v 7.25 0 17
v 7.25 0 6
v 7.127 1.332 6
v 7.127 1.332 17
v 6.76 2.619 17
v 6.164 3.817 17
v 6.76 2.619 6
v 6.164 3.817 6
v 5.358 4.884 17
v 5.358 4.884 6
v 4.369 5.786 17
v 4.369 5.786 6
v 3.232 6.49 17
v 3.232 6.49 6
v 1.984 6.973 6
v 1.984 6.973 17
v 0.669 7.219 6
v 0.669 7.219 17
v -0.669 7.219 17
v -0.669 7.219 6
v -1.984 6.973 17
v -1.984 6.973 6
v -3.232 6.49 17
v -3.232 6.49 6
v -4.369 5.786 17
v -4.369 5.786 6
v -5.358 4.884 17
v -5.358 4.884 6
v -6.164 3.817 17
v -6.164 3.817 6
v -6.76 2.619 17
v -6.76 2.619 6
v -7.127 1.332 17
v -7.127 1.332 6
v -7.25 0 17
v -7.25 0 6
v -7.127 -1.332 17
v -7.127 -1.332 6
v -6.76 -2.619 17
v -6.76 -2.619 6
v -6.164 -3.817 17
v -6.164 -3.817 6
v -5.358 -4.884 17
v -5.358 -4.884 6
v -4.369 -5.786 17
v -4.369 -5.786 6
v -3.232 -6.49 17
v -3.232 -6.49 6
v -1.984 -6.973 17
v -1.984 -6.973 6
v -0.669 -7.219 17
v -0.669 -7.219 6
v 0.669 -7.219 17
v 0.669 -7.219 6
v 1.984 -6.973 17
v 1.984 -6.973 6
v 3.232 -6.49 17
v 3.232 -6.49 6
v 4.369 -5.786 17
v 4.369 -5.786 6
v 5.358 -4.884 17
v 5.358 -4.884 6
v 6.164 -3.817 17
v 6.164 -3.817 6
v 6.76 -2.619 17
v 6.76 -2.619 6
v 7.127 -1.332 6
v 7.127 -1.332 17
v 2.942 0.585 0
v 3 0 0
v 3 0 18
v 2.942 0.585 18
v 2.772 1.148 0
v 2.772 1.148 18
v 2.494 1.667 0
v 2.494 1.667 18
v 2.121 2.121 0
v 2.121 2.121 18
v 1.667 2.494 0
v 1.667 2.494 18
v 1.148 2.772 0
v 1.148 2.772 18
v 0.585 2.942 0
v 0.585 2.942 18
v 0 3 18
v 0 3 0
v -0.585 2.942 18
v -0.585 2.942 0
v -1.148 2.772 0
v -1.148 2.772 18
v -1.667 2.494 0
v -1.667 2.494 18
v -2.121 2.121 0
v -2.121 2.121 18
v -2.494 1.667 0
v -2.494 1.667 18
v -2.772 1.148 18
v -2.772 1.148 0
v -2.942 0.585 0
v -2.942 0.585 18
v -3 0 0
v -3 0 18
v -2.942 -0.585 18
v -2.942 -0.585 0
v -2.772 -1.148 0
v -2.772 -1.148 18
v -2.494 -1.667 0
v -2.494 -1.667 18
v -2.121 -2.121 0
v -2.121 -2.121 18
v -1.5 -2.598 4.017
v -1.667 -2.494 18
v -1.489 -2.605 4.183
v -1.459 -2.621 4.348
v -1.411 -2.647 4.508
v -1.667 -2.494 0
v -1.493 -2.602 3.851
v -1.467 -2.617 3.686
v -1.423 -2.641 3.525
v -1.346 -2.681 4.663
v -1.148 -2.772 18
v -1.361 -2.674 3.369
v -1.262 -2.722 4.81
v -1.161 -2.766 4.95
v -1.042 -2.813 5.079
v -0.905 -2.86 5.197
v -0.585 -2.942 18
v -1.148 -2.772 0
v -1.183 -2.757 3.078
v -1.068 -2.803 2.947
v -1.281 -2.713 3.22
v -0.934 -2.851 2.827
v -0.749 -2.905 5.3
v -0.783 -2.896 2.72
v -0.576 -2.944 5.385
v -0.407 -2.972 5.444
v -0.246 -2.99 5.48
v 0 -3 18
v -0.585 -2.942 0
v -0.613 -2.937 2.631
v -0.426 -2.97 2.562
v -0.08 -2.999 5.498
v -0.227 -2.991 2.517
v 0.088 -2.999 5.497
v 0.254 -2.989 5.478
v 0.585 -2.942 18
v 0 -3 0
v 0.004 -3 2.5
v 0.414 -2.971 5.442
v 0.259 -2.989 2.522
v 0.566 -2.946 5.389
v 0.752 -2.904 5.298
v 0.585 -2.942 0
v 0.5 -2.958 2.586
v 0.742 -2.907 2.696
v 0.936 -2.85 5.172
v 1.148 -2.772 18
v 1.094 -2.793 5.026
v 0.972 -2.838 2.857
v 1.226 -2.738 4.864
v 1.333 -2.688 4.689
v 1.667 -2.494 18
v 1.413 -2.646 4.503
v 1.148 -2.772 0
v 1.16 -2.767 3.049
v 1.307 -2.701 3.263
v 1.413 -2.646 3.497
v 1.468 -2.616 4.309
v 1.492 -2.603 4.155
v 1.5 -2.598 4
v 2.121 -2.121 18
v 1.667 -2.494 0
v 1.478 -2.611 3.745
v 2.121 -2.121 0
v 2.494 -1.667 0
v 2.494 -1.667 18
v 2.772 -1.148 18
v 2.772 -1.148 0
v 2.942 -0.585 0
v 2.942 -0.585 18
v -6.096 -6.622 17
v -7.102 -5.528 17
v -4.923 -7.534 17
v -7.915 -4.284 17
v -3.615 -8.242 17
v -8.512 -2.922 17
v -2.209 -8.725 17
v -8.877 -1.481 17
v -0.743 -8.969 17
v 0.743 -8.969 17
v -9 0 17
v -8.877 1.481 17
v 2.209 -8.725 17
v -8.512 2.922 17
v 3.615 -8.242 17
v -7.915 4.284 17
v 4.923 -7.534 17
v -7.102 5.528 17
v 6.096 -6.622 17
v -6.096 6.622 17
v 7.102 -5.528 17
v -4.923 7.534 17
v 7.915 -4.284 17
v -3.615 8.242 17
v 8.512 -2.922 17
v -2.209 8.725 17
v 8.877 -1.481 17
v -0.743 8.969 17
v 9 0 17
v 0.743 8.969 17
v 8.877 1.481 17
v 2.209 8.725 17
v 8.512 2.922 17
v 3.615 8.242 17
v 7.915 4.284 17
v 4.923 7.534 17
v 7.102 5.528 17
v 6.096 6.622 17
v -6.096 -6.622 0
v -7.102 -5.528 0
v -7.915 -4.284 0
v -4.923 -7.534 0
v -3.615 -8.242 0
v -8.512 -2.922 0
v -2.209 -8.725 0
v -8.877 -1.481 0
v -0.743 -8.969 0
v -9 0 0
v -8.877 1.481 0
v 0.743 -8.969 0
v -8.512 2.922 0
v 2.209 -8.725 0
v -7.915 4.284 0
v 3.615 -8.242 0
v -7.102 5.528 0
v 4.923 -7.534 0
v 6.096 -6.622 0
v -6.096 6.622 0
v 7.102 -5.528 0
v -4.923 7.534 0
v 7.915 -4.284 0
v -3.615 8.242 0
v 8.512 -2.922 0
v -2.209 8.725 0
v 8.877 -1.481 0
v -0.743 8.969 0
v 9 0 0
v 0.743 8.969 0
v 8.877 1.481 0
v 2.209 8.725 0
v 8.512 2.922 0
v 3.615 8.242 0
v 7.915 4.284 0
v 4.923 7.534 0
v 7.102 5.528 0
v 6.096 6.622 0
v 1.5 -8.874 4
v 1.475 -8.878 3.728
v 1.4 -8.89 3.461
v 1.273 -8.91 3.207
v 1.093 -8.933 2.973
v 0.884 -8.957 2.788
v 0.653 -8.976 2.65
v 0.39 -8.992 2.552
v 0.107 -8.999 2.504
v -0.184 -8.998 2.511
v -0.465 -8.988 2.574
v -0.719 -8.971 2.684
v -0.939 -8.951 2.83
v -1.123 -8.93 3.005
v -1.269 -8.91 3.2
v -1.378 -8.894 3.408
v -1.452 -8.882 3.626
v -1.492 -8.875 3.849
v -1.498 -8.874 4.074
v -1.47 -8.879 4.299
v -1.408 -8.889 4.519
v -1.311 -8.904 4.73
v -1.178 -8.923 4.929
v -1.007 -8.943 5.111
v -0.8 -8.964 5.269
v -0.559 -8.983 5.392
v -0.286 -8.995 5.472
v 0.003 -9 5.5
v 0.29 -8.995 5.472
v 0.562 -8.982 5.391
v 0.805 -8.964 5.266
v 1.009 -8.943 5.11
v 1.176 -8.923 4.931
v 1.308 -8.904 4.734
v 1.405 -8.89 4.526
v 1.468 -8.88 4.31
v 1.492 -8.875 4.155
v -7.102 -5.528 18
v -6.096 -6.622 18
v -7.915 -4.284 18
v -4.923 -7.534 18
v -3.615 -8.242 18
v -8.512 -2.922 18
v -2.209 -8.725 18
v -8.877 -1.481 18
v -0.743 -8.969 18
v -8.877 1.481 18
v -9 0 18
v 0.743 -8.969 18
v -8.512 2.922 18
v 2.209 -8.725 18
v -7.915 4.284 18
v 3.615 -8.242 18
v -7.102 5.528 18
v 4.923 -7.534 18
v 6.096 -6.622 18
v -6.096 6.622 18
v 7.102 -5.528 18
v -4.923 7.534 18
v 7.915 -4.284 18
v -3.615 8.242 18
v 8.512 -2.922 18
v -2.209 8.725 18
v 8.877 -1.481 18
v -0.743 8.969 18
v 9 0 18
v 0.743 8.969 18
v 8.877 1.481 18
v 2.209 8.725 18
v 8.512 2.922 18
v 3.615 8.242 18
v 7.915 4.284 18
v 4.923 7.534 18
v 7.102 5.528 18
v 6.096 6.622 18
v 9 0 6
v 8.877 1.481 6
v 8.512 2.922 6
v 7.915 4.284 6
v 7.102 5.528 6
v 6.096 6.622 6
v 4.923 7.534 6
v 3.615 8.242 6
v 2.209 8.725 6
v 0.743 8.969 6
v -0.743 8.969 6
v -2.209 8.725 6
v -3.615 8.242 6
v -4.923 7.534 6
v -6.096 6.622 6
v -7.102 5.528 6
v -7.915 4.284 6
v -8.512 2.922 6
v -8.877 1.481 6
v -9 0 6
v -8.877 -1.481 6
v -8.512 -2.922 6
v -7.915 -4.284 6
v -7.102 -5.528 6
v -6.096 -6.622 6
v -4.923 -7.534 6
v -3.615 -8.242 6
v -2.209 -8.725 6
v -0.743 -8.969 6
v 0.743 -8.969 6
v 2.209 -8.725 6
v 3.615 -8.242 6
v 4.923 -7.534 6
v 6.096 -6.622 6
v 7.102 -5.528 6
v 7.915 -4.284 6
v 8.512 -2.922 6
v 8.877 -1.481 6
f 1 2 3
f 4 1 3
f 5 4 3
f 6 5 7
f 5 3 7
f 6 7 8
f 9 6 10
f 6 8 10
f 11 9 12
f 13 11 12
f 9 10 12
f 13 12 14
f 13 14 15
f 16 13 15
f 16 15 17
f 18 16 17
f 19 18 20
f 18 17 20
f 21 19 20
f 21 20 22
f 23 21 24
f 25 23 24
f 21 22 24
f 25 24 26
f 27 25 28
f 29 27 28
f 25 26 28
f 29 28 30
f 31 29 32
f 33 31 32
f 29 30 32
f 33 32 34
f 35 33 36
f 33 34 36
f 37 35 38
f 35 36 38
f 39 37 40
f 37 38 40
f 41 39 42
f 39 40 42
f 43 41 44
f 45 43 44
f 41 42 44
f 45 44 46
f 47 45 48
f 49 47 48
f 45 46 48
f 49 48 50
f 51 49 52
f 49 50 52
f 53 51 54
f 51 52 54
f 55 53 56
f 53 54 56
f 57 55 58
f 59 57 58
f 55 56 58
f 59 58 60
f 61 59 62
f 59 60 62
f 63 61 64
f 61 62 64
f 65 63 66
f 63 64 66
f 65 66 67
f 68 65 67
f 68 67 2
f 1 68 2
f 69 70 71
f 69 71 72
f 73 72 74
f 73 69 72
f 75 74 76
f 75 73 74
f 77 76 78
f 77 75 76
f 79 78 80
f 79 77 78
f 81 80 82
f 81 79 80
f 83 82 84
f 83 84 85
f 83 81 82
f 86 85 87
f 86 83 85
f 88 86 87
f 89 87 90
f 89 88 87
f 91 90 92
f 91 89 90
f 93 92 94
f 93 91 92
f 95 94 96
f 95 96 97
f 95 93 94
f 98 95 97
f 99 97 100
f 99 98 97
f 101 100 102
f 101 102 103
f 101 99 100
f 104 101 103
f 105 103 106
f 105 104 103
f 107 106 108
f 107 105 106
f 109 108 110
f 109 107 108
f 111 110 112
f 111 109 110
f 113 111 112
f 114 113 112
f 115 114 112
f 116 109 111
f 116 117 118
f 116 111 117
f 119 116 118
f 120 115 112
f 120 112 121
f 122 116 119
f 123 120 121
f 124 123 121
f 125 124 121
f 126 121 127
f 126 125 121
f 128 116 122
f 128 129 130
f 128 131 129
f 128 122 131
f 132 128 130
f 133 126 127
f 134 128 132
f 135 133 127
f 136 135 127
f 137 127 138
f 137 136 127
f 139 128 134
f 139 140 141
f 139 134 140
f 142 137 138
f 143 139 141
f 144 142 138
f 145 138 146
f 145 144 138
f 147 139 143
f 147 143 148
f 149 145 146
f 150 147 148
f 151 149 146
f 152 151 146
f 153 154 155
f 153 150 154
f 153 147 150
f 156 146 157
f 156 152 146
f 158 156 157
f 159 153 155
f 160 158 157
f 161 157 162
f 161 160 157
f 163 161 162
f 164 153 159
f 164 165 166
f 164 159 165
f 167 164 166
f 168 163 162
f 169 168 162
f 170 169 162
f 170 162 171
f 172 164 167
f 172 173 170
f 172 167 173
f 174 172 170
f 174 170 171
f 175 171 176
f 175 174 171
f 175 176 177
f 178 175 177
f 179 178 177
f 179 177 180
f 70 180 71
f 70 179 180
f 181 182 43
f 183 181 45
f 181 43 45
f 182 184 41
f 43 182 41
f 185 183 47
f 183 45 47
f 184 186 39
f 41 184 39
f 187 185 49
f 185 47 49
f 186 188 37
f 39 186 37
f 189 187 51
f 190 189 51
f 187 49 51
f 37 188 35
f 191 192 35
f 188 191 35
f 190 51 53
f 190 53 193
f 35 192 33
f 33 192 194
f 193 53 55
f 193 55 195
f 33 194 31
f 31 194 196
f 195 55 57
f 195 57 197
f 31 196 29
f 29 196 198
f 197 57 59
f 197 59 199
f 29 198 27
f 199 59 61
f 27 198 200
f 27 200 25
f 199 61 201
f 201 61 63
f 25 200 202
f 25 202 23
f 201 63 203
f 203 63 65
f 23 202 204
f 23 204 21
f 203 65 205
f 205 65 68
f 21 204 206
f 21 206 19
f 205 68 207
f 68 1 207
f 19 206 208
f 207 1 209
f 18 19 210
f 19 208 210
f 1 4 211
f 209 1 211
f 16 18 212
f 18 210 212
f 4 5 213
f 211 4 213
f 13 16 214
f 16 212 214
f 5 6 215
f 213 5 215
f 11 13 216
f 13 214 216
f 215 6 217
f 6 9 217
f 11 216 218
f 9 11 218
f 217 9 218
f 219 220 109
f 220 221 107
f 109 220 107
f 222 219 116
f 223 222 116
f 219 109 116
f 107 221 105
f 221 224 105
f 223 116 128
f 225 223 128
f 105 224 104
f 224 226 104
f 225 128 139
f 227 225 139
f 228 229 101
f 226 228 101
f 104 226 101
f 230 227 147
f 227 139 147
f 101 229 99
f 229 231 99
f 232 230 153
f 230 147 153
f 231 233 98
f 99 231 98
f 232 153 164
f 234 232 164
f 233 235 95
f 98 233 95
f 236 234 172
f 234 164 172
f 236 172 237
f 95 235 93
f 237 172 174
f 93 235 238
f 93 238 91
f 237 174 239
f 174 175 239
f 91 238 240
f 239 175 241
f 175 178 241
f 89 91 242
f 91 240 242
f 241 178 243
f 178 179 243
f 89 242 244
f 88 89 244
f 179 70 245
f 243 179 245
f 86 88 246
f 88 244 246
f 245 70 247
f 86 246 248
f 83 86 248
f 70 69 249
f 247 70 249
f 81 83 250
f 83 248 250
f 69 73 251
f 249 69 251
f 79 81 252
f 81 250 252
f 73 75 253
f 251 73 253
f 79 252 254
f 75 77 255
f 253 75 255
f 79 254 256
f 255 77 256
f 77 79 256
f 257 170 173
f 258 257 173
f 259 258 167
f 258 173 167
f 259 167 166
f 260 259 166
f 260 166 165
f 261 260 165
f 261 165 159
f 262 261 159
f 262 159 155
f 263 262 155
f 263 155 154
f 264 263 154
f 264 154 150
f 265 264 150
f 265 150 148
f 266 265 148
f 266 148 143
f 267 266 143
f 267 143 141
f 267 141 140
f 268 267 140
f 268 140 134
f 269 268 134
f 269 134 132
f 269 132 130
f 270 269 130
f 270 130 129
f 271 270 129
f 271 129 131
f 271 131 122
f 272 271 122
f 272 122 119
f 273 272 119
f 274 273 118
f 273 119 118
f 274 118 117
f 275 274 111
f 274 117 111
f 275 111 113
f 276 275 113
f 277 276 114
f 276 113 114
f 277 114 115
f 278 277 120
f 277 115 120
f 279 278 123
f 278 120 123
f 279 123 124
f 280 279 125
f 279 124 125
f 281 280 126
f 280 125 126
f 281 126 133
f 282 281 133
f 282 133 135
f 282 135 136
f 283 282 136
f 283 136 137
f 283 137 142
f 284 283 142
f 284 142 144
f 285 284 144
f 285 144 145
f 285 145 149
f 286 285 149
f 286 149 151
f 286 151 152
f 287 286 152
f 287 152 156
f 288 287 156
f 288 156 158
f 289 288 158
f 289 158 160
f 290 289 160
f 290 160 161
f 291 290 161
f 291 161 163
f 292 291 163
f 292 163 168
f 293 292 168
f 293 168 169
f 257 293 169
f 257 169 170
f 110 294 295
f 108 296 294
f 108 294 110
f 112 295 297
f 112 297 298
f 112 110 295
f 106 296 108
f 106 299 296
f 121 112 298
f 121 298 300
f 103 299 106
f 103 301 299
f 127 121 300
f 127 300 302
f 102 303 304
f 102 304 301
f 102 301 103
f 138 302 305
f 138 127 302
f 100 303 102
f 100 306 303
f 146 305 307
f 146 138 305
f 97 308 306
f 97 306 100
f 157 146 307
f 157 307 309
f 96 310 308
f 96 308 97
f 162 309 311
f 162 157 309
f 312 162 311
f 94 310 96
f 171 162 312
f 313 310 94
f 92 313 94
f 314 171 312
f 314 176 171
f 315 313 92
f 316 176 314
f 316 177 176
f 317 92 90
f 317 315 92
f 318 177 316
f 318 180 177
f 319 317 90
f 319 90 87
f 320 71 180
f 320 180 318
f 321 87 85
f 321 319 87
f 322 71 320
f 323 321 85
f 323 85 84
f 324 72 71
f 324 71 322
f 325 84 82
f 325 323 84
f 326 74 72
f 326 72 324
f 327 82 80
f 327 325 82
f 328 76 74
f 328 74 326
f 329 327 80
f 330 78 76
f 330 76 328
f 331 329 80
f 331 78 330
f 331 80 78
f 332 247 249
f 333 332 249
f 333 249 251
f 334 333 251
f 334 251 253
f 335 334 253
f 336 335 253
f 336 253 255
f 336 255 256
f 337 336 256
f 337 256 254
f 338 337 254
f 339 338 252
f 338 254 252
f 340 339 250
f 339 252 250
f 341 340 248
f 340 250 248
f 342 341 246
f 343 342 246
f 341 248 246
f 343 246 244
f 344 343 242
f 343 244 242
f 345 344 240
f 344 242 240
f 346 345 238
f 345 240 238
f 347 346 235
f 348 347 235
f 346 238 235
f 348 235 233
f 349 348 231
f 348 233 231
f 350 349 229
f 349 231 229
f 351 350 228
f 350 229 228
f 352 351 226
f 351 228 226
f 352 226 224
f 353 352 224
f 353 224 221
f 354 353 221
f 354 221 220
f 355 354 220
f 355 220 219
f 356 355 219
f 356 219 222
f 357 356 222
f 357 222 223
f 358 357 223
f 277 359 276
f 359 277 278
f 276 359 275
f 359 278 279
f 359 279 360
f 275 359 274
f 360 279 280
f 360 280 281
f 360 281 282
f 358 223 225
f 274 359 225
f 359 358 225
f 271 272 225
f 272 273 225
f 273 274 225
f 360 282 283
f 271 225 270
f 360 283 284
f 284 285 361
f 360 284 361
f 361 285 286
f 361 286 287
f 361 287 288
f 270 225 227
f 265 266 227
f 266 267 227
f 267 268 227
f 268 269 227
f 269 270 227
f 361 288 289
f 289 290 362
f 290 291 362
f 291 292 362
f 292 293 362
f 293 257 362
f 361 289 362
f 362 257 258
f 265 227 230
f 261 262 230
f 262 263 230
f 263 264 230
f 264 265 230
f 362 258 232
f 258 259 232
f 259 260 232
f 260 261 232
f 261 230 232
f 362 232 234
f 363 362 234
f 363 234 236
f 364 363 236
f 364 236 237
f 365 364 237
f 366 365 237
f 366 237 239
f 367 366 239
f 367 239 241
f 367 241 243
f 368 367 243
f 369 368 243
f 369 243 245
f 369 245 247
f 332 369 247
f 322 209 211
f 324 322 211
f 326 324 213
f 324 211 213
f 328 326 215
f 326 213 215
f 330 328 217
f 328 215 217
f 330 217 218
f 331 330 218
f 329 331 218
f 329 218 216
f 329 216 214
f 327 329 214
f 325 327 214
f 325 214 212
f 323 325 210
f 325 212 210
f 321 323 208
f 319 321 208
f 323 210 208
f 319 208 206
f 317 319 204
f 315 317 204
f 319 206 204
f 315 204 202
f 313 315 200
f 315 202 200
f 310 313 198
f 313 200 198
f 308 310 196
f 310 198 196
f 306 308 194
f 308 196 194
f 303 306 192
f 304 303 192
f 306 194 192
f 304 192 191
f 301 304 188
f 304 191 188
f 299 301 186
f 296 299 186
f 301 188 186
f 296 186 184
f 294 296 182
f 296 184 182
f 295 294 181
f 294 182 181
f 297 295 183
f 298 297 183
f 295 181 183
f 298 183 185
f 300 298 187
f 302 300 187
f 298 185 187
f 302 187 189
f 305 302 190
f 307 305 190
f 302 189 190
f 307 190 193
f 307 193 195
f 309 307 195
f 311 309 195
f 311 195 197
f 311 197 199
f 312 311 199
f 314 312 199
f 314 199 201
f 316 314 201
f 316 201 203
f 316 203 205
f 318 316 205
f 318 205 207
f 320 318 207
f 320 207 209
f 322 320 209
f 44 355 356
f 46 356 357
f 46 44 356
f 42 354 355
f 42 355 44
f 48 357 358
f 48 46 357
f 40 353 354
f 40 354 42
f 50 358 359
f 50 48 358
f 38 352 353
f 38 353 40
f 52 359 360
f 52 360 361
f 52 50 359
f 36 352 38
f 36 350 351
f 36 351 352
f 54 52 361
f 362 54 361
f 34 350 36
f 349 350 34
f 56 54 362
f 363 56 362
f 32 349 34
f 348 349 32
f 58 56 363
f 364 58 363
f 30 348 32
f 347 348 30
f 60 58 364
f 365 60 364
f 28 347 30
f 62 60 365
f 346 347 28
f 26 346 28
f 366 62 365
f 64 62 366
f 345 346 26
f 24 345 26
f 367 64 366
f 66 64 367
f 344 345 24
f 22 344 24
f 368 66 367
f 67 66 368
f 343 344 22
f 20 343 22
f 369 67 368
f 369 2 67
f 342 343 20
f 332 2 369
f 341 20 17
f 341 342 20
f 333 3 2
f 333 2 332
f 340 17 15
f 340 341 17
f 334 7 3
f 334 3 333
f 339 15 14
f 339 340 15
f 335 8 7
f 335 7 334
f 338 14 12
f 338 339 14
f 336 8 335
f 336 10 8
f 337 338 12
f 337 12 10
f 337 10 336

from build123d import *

# Parameters (mm, degrees)
SKETCH1_R           = 9
SKETCH1_R_2         = 3
BOSS_EXTRUDE1_DEPTH = 6
SKETCH2_R           = 7.25
SKETCH2_R_2         = 3
BOSS_EXTRUDE2_DEPTH = 11
SKETCH3_R           = 9
SKETCH3_R_2         = 3
BOSS_EXTRUDE3_DEPTH = 1
SKETCH4_R           = 1.5
CUT_EXTRUDE1_DEPTH  = 10


with BuildPart() as part:
    # Sketch1 → Boss-Extrude1 (new body)
    with BuildSketch(Plane.XY):
        Circle(SKETCH1_R)
        Circle(SKETCH1_R_2, mode=Mode.SUBTRACT)
    extrude(amount=BOSS_EXTRUDE1_DEPTH)

    # Sketch2 → Boss-Extrude2 (add)
    with BuildSketch(Plane.XY.offset(6)):
        Circle(SKETCH2_R)
        Circle(SKETCH2_R_2, mode=Mode.SUBTRACT)
    extrude(amount=BOSS_EXTRUDE2_DEPTH)

    # Sketch3 → Boss-Extrude3 (add)
    with BuildSketch(Plane.XY.offset(17)):
        Circle(SKETCH3_R)
        Circle(SKETCH3_R_2, mode=Mode.SUBTRACT)
    extrude(amount=BOSS_EXTRUDE3_DEPTH)

    # Sketch4 → Cut-Extrude1 (cut, through all)
    with BuildSketch(Plane(origin=(0, 0, 0), x_dir=(1, 0, 0), z_dir=(0, 1, 0))):
        with Locations((0, -4)):
            Circle(SKETCH4_R)
    extrude(amount=-CUT_EXTRUDE1_DEPTH, mode=Mode.SUBTRACT)


solid = part.part
